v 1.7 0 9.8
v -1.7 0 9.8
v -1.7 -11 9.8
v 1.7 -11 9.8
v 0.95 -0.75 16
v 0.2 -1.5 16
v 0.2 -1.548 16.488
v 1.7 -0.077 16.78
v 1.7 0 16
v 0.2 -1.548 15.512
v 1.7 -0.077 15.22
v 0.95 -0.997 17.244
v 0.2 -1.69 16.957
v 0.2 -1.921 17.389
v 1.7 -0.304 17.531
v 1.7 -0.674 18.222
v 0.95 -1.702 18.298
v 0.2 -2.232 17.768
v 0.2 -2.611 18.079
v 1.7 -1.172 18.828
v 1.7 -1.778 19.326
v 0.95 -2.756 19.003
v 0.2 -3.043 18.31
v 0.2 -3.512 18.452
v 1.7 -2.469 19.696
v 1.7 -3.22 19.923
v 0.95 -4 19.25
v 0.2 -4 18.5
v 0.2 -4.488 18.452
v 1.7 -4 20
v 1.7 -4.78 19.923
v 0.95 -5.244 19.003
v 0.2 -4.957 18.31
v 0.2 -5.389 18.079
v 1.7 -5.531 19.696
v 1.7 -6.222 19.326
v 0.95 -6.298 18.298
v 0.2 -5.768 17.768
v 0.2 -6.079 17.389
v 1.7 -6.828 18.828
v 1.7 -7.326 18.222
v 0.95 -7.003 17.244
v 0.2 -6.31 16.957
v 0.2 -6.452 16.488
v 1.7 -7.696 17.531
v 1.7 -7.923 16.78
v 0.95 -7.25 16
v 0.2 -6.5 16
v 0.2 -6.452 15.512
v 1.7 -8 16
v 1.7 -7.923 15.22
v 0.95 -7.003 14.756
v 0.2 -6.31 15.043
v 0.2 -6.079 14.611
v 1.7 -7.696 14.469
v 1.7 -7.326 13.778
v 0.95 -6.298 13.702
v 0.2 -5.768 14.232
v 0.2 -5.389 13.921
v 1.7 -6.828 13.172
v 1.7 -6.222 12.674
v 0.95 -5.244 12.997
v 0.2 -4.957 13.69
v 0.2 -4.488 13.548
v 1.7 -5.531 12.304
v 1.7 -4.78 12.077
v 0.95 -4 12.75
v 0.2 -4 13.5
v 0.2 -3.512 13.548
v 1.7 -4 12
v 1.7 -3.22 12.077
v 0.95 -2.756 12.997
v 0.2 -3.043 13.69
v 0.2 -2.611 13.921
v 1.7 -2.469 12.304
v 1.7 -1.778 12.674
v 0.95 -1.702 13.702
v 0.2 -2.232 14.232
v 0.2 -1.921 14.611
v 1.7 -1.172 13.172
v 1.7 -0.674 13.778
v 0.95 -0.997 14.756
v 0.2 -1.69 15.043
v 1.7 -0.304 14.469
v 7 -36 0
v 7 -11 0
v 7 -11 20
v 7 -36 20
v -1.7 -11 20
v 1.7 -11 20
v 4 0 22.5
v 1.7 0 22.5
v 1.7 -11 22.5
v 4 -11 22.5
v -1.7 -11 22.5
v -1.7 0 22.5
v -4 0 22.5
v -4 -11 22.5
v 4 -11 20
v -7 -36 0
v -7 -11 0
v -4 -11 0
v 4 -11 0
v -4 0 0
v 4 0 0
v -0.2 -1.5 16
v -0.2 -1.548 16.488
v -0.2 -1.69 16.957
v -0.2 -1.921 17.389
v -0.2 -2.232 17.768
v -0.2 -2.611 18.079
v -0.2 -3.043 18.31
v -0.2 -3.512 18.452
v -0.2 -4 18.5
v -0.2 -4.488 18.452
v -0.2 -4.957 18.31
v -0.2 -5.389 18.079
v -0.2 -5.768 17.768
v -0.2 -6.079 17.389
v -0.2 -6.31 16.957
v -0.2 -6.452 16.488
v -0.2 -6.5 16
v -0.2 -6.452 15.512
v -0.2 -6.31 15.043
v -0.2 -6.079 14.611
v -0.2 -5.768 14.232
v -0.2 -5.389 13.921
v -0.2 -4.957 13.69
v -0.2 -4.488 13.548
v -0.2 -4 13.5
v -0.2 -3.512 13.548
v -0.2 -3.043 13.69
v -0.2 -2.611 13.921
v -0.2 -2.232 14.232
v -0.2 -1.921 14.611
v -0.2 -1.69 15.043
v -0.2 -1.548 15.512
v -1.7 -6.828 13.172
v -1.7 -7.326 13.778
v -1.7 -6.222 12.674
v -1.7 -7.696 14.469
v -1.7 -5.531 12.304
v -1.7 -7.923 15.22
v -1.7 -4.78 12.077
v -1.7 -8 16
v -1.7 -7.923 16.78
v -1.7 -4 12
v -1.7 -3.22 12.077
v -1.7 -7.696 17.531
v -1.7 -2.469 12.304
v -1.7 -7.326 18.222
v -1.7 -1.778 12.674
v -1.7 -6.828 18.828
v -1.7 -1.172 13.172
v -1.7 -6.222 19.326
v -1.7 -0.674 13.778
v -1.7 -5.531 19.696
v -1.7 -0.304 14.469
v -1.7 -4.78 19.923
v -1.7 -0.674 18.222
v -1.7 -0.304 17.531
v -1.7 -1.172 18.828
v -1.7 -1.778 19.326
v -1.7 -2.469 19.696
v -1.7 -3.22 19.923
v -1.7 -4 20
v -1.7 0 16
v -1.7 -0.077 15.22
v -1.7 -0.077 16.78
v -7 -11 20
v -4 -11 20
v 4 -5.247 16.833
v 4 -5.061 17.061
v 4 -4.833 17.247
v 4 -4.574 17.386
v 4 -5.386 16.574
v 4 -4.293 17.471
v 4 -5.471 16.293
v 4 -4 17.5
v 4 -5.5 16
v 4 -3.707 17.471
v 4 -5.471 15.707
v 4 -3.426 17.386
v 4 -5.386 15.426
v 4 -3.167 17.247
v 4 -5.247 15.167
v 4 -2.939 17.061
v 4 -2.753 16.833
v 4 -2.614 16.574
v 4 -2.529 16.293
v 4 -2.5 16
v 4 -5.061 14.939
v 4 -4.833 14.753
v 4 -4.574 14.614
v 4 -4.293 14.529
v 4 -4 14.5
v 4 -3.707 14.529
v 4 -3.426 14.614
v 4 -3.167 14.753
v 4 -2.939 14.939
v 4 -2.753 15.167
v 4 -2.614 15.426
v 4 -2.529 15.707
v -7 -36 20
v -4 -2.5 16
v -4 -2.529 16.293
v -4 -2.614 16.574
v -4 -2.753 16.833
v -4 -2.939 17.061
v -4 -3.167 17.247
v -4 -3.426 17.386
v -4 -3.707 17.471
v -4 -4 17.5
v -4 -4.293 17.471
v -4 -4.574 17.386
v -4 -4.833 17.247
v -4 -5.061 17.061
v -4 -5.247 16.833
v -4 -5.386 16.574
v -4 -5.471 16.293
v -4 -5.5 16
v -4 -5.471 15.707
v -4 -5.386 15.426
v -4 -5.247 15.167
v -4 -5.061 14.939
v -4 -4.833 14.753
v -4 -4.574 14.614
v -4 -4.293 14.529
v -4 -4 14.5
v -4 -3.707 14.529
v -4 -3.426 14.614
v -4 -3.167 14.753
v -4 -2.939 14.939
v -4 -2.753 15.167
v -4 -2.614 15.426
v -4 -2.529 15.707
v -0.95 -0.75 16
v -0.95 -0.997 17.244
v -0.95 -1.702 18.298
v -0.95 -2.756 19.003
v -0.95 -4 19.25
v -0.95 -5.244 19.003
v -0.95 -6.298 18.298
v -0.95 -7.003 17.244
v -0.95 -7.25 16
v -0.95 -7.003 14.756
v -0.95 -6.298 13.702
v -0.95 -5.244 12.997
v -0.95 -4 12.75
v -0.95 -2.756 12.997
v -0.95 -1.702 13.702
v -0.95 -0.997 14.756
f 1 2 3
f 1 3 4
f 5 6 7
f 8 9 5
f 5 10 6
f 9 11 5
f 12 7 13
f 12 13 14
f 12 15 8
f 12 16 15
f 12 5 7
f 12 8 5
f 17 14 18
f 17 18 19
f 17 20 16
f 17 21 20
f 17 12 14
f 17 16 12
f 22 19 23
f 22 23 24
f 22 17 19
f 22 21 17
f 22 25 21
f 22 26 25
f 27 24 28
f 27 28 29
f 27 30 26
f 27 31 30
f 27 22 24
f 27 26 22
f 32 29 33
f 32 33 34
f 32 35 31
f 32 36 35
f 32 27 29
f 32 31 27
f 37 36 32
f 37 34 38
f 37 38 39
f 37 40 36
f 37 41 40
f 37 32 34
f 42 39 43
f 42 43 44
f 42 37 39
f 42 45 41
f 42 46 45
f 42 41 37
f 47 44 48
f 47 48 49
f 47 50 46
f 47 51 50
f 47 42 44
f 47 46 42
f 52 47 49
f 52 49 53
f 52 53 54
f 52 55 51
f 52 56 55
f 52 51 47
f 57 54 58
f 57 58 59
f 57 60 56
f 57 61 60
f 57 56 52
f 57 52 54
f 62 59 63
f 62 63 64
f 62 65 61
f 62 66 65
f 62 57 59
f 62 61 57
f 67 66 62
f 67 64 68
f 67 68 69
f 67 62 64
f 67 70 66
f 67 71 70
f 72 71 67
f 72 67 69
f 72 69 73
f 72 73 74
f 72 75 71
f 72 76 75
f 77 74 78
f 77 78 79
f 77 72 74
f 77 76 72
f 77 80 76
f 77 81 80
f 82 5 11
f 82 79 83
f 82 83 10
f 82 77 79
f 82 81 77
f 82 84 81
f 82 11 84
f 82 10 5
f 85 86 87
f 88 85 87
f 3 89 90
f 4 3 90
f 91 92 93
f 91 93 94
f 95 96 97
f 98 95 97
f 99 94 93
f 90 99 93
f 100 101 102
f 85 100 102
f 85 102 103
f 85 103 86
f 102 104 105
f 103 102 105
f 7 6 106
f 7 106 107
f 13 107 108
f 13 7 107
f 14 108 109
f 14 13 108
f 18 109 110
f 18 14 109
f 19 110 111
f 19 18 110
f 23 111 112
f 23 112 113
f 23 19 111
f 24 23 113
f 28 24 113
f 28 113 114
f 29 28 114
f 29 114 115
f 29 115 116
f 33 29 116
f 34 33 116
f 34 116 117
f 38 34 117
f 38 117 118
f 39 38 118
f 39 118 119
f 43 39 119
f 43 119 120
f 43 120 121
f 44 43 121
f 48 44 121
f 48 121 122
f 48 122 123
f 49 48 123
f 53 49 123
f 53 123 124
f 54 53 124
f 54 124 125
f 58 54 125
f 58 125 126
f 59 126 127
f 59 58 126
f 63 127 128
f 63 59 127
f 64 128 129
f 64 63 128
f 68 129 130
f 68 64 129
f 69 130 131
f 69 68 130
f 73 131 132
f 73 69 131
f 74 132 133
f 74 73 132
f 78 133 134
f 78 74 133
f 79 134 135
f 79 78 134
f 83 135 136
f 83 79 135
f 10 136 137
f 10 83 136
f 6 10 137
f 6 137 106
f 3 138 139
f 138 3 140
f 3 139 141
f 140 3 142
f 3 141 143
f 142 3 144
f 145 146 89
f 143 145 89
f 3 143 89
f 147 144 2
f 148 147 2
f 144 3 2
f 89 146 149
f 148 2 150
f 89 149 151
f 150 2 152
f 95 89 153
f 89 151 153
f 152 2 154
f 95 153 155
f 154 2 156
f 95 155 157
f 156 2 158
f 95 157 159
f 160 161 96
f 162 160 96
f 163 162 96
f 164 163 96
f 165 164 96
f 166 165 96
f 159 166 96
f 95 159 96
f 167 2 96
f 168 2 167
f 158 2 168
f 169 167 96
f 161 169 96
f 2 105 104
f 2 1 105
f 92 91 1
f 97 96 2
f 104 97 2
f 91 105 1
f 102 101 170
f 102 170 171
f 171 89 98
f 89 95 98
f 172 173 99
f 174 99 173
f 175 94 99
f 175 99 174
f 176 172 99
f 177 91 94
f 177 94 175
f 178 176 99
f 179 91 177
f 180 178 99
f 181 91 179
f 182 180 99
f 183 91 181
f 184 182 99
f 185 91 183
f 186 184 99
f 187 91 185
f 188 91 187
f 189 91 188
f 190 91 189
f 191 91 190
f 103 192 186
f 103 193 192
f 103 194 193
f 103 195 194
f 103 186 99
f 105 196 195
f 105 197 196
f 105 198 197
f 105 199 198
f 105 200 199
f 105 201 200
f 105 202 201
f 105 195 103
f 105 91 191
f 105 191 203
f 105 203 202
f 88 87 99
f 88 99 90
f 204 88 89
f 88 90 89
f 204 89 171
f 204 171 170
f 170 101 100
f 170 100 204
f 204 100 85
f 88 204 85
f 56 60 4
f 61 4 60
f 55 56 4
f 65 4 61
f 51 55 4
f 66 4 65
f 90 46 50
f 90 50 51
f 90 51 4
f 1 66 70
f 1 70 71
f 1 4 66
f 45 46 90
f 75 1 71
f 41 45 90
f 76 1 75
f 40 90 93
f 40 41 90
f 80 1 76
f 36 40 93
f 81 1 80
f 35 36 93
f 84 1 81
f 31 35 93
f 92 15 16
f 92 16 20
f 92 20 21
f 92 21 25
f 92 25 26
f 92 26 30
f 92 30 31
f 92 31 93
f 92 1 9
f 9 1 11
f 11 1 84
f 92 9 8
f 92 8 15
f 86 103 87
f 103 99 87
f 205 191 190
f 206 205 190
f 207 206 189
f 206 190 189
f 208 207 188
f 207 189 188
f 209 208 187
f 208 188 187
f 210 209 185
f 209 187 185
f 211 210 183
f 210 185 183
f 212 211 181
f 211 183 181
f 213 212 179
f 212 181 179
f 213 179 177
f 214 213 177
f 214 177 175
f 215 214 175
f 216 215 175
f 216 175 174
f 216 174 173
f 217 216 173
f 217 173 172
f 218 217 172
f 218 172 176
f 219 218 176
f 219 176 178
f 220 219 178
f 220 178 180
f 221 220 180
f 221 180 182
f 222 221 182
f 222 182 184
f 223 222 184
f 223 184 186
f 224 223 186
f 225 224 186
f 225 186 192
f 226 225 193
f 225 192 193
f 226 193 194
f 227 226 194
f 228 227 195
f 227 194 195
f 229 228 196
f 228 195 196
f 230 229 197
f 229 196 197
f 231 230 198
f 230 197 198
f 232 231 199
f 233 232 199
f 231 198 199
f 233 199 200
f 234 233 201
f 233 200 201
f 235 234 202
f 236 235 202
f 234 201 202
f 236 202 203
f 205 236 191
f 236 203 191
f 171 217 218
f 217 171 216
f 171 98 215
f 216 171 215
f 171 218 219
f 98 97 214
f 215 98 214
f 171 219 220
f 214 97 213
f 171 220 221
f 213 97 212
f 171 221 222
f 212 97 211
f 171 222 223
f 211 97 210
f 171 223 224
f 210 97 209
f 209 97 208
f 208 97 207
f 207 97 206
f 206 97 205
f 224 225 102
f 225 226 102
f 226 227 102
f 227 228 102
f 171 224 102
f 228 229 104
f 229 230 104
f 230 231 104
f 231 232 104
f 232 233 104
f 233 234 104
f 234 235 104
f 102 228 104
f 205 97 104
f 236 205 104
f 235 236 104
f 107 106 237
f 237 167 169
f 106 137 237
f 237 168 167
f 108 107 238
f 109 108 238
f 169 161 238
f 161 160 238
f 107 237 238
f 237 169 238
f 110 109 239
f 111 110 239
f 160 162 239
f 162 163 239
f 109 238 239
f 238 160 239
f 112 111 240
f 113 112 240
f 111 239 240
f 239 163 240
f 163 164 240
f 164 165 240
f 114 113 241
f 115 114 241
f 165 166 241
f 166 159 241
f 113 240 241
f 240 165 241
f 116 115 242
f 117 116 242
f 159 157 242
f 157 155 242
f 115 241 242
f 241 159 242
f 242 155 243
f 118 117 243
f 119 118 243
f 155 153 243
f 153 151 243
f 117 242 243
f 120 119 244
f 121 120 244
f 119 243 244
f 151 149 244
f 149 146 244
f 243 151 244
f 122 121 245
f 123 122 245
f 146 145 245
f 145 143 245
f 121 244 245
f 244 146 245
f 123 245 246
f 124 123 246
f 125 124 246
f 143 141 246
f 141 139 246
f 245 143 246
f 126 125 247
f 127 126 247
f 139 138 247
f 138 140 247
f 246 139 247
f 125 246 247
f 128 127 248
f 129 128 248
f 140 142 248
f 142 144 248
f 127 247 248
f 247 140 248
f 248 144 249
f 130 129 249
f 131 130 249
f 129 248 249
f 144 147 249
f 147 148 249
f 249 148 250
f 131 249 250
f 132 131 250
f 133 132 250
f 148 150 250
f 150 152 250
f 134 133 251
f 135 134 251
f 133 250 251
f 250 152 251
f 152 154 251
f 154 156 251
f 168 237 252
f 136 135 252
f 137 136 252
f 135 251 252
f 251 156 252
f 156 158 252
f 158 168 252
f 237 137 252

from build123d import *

# Parameters (mm, degrees)
F1_DEPTH = 11
F3_W     = 3
F3_H     = 20
F3_W_2   = 3.4
F3_H_2   = 10.2
F4_DEPTH = 25
F5_R     = 1.5
F6_DEPTH = 25
F5_R_2   = 2.5
F7_DEPTH = 8
F8_SIZE  = 1.49999
F9_SIZE  = 1.49999


# Not quite as in the source:
# - a fillet or chamfer is up to 0.001 mm smaller than in the source, because OpenCascade refuses the exact size


with BuildPart() as f1:
    # F0 (on Front) → F1 (new body)
    with BuildSketch(Plane.XZ):
        Polygon((-4, 0), (0, 0), (0, 9.8), (-1.7, 9.8), (-1.7, 22.5), (-4, 22.5), align=None)
    extrude(amount=F1_DEPTH)

    # F2: F1 across face


with BuildPart() as f1_1:
    add(f1.part)
    add(f1.part.mirror(Plane(origin=(0, -5.5, 4.9), x_dir=(0, 1, 0), z_dir=(1, 0, 0))))

    # F3 (on face) → F4 (join)
    with BuildSketch(Plane.XZ.offset(11)):
        with Locations((5.5, 10)):
            Rectangle(F3_W, F3_H)
        with Locations((0, 14.9)):
            Rectangle(F3_W_2, F3_H_2)
        Polygon((-4, 0), (0, 0), (4, 0), (4, 20), (1.7, 20), (1.7, 9.8), (-1.7, 9.8), (-1.7, 20), (-4, 20), align=None)
        with Locations((-5.5, 10)):
            Rectangle(F3_W, F3_H)
    extrude(amount=F4_DEPTH)

    # F5 (on face) → F6 (cut)
    with BuildSketch(Plane.YZ.offset(4)):
        with Locations((-4, 16)):
            Circle(F5_R)
    extrude(amount=-F6_DEPTH, mode=Mode.SUBTRACT)

    # F5 (on face) → F7 (join, through all)
    with BuildSketch(Plane.YZ.offset(4)):
        with Locations((-4, 16)):
            Circle(F5_R_2)
        with Locations((-4, 16)):
            Circle(F5_R, mode=Mode.SUBTRACT)
    extrude(amount=-F7_DEPTH)

    # F8 (size 1.5 in the source; OpenCascade refuses exactly that, so slightly less here)
    f8_edges = [f1_1.edges().sort_by_distance(p)[0] for p in [
        (-1.7, -6.5, 16),
    ]]
    chamfer(f8_edges, length=F8_SIZE)

    # F9 (size 1.5 in the source; OpenCascade refuses exactly that, so slightly less here)
    f9_edges = [f1_1.edges().sort_by_distance(p)[0] for p in [
        (1.7, -6.5, 16),
    ]]
    chamfer(f9_edges, length=F9_SIZE)


solid = f1_1.part
